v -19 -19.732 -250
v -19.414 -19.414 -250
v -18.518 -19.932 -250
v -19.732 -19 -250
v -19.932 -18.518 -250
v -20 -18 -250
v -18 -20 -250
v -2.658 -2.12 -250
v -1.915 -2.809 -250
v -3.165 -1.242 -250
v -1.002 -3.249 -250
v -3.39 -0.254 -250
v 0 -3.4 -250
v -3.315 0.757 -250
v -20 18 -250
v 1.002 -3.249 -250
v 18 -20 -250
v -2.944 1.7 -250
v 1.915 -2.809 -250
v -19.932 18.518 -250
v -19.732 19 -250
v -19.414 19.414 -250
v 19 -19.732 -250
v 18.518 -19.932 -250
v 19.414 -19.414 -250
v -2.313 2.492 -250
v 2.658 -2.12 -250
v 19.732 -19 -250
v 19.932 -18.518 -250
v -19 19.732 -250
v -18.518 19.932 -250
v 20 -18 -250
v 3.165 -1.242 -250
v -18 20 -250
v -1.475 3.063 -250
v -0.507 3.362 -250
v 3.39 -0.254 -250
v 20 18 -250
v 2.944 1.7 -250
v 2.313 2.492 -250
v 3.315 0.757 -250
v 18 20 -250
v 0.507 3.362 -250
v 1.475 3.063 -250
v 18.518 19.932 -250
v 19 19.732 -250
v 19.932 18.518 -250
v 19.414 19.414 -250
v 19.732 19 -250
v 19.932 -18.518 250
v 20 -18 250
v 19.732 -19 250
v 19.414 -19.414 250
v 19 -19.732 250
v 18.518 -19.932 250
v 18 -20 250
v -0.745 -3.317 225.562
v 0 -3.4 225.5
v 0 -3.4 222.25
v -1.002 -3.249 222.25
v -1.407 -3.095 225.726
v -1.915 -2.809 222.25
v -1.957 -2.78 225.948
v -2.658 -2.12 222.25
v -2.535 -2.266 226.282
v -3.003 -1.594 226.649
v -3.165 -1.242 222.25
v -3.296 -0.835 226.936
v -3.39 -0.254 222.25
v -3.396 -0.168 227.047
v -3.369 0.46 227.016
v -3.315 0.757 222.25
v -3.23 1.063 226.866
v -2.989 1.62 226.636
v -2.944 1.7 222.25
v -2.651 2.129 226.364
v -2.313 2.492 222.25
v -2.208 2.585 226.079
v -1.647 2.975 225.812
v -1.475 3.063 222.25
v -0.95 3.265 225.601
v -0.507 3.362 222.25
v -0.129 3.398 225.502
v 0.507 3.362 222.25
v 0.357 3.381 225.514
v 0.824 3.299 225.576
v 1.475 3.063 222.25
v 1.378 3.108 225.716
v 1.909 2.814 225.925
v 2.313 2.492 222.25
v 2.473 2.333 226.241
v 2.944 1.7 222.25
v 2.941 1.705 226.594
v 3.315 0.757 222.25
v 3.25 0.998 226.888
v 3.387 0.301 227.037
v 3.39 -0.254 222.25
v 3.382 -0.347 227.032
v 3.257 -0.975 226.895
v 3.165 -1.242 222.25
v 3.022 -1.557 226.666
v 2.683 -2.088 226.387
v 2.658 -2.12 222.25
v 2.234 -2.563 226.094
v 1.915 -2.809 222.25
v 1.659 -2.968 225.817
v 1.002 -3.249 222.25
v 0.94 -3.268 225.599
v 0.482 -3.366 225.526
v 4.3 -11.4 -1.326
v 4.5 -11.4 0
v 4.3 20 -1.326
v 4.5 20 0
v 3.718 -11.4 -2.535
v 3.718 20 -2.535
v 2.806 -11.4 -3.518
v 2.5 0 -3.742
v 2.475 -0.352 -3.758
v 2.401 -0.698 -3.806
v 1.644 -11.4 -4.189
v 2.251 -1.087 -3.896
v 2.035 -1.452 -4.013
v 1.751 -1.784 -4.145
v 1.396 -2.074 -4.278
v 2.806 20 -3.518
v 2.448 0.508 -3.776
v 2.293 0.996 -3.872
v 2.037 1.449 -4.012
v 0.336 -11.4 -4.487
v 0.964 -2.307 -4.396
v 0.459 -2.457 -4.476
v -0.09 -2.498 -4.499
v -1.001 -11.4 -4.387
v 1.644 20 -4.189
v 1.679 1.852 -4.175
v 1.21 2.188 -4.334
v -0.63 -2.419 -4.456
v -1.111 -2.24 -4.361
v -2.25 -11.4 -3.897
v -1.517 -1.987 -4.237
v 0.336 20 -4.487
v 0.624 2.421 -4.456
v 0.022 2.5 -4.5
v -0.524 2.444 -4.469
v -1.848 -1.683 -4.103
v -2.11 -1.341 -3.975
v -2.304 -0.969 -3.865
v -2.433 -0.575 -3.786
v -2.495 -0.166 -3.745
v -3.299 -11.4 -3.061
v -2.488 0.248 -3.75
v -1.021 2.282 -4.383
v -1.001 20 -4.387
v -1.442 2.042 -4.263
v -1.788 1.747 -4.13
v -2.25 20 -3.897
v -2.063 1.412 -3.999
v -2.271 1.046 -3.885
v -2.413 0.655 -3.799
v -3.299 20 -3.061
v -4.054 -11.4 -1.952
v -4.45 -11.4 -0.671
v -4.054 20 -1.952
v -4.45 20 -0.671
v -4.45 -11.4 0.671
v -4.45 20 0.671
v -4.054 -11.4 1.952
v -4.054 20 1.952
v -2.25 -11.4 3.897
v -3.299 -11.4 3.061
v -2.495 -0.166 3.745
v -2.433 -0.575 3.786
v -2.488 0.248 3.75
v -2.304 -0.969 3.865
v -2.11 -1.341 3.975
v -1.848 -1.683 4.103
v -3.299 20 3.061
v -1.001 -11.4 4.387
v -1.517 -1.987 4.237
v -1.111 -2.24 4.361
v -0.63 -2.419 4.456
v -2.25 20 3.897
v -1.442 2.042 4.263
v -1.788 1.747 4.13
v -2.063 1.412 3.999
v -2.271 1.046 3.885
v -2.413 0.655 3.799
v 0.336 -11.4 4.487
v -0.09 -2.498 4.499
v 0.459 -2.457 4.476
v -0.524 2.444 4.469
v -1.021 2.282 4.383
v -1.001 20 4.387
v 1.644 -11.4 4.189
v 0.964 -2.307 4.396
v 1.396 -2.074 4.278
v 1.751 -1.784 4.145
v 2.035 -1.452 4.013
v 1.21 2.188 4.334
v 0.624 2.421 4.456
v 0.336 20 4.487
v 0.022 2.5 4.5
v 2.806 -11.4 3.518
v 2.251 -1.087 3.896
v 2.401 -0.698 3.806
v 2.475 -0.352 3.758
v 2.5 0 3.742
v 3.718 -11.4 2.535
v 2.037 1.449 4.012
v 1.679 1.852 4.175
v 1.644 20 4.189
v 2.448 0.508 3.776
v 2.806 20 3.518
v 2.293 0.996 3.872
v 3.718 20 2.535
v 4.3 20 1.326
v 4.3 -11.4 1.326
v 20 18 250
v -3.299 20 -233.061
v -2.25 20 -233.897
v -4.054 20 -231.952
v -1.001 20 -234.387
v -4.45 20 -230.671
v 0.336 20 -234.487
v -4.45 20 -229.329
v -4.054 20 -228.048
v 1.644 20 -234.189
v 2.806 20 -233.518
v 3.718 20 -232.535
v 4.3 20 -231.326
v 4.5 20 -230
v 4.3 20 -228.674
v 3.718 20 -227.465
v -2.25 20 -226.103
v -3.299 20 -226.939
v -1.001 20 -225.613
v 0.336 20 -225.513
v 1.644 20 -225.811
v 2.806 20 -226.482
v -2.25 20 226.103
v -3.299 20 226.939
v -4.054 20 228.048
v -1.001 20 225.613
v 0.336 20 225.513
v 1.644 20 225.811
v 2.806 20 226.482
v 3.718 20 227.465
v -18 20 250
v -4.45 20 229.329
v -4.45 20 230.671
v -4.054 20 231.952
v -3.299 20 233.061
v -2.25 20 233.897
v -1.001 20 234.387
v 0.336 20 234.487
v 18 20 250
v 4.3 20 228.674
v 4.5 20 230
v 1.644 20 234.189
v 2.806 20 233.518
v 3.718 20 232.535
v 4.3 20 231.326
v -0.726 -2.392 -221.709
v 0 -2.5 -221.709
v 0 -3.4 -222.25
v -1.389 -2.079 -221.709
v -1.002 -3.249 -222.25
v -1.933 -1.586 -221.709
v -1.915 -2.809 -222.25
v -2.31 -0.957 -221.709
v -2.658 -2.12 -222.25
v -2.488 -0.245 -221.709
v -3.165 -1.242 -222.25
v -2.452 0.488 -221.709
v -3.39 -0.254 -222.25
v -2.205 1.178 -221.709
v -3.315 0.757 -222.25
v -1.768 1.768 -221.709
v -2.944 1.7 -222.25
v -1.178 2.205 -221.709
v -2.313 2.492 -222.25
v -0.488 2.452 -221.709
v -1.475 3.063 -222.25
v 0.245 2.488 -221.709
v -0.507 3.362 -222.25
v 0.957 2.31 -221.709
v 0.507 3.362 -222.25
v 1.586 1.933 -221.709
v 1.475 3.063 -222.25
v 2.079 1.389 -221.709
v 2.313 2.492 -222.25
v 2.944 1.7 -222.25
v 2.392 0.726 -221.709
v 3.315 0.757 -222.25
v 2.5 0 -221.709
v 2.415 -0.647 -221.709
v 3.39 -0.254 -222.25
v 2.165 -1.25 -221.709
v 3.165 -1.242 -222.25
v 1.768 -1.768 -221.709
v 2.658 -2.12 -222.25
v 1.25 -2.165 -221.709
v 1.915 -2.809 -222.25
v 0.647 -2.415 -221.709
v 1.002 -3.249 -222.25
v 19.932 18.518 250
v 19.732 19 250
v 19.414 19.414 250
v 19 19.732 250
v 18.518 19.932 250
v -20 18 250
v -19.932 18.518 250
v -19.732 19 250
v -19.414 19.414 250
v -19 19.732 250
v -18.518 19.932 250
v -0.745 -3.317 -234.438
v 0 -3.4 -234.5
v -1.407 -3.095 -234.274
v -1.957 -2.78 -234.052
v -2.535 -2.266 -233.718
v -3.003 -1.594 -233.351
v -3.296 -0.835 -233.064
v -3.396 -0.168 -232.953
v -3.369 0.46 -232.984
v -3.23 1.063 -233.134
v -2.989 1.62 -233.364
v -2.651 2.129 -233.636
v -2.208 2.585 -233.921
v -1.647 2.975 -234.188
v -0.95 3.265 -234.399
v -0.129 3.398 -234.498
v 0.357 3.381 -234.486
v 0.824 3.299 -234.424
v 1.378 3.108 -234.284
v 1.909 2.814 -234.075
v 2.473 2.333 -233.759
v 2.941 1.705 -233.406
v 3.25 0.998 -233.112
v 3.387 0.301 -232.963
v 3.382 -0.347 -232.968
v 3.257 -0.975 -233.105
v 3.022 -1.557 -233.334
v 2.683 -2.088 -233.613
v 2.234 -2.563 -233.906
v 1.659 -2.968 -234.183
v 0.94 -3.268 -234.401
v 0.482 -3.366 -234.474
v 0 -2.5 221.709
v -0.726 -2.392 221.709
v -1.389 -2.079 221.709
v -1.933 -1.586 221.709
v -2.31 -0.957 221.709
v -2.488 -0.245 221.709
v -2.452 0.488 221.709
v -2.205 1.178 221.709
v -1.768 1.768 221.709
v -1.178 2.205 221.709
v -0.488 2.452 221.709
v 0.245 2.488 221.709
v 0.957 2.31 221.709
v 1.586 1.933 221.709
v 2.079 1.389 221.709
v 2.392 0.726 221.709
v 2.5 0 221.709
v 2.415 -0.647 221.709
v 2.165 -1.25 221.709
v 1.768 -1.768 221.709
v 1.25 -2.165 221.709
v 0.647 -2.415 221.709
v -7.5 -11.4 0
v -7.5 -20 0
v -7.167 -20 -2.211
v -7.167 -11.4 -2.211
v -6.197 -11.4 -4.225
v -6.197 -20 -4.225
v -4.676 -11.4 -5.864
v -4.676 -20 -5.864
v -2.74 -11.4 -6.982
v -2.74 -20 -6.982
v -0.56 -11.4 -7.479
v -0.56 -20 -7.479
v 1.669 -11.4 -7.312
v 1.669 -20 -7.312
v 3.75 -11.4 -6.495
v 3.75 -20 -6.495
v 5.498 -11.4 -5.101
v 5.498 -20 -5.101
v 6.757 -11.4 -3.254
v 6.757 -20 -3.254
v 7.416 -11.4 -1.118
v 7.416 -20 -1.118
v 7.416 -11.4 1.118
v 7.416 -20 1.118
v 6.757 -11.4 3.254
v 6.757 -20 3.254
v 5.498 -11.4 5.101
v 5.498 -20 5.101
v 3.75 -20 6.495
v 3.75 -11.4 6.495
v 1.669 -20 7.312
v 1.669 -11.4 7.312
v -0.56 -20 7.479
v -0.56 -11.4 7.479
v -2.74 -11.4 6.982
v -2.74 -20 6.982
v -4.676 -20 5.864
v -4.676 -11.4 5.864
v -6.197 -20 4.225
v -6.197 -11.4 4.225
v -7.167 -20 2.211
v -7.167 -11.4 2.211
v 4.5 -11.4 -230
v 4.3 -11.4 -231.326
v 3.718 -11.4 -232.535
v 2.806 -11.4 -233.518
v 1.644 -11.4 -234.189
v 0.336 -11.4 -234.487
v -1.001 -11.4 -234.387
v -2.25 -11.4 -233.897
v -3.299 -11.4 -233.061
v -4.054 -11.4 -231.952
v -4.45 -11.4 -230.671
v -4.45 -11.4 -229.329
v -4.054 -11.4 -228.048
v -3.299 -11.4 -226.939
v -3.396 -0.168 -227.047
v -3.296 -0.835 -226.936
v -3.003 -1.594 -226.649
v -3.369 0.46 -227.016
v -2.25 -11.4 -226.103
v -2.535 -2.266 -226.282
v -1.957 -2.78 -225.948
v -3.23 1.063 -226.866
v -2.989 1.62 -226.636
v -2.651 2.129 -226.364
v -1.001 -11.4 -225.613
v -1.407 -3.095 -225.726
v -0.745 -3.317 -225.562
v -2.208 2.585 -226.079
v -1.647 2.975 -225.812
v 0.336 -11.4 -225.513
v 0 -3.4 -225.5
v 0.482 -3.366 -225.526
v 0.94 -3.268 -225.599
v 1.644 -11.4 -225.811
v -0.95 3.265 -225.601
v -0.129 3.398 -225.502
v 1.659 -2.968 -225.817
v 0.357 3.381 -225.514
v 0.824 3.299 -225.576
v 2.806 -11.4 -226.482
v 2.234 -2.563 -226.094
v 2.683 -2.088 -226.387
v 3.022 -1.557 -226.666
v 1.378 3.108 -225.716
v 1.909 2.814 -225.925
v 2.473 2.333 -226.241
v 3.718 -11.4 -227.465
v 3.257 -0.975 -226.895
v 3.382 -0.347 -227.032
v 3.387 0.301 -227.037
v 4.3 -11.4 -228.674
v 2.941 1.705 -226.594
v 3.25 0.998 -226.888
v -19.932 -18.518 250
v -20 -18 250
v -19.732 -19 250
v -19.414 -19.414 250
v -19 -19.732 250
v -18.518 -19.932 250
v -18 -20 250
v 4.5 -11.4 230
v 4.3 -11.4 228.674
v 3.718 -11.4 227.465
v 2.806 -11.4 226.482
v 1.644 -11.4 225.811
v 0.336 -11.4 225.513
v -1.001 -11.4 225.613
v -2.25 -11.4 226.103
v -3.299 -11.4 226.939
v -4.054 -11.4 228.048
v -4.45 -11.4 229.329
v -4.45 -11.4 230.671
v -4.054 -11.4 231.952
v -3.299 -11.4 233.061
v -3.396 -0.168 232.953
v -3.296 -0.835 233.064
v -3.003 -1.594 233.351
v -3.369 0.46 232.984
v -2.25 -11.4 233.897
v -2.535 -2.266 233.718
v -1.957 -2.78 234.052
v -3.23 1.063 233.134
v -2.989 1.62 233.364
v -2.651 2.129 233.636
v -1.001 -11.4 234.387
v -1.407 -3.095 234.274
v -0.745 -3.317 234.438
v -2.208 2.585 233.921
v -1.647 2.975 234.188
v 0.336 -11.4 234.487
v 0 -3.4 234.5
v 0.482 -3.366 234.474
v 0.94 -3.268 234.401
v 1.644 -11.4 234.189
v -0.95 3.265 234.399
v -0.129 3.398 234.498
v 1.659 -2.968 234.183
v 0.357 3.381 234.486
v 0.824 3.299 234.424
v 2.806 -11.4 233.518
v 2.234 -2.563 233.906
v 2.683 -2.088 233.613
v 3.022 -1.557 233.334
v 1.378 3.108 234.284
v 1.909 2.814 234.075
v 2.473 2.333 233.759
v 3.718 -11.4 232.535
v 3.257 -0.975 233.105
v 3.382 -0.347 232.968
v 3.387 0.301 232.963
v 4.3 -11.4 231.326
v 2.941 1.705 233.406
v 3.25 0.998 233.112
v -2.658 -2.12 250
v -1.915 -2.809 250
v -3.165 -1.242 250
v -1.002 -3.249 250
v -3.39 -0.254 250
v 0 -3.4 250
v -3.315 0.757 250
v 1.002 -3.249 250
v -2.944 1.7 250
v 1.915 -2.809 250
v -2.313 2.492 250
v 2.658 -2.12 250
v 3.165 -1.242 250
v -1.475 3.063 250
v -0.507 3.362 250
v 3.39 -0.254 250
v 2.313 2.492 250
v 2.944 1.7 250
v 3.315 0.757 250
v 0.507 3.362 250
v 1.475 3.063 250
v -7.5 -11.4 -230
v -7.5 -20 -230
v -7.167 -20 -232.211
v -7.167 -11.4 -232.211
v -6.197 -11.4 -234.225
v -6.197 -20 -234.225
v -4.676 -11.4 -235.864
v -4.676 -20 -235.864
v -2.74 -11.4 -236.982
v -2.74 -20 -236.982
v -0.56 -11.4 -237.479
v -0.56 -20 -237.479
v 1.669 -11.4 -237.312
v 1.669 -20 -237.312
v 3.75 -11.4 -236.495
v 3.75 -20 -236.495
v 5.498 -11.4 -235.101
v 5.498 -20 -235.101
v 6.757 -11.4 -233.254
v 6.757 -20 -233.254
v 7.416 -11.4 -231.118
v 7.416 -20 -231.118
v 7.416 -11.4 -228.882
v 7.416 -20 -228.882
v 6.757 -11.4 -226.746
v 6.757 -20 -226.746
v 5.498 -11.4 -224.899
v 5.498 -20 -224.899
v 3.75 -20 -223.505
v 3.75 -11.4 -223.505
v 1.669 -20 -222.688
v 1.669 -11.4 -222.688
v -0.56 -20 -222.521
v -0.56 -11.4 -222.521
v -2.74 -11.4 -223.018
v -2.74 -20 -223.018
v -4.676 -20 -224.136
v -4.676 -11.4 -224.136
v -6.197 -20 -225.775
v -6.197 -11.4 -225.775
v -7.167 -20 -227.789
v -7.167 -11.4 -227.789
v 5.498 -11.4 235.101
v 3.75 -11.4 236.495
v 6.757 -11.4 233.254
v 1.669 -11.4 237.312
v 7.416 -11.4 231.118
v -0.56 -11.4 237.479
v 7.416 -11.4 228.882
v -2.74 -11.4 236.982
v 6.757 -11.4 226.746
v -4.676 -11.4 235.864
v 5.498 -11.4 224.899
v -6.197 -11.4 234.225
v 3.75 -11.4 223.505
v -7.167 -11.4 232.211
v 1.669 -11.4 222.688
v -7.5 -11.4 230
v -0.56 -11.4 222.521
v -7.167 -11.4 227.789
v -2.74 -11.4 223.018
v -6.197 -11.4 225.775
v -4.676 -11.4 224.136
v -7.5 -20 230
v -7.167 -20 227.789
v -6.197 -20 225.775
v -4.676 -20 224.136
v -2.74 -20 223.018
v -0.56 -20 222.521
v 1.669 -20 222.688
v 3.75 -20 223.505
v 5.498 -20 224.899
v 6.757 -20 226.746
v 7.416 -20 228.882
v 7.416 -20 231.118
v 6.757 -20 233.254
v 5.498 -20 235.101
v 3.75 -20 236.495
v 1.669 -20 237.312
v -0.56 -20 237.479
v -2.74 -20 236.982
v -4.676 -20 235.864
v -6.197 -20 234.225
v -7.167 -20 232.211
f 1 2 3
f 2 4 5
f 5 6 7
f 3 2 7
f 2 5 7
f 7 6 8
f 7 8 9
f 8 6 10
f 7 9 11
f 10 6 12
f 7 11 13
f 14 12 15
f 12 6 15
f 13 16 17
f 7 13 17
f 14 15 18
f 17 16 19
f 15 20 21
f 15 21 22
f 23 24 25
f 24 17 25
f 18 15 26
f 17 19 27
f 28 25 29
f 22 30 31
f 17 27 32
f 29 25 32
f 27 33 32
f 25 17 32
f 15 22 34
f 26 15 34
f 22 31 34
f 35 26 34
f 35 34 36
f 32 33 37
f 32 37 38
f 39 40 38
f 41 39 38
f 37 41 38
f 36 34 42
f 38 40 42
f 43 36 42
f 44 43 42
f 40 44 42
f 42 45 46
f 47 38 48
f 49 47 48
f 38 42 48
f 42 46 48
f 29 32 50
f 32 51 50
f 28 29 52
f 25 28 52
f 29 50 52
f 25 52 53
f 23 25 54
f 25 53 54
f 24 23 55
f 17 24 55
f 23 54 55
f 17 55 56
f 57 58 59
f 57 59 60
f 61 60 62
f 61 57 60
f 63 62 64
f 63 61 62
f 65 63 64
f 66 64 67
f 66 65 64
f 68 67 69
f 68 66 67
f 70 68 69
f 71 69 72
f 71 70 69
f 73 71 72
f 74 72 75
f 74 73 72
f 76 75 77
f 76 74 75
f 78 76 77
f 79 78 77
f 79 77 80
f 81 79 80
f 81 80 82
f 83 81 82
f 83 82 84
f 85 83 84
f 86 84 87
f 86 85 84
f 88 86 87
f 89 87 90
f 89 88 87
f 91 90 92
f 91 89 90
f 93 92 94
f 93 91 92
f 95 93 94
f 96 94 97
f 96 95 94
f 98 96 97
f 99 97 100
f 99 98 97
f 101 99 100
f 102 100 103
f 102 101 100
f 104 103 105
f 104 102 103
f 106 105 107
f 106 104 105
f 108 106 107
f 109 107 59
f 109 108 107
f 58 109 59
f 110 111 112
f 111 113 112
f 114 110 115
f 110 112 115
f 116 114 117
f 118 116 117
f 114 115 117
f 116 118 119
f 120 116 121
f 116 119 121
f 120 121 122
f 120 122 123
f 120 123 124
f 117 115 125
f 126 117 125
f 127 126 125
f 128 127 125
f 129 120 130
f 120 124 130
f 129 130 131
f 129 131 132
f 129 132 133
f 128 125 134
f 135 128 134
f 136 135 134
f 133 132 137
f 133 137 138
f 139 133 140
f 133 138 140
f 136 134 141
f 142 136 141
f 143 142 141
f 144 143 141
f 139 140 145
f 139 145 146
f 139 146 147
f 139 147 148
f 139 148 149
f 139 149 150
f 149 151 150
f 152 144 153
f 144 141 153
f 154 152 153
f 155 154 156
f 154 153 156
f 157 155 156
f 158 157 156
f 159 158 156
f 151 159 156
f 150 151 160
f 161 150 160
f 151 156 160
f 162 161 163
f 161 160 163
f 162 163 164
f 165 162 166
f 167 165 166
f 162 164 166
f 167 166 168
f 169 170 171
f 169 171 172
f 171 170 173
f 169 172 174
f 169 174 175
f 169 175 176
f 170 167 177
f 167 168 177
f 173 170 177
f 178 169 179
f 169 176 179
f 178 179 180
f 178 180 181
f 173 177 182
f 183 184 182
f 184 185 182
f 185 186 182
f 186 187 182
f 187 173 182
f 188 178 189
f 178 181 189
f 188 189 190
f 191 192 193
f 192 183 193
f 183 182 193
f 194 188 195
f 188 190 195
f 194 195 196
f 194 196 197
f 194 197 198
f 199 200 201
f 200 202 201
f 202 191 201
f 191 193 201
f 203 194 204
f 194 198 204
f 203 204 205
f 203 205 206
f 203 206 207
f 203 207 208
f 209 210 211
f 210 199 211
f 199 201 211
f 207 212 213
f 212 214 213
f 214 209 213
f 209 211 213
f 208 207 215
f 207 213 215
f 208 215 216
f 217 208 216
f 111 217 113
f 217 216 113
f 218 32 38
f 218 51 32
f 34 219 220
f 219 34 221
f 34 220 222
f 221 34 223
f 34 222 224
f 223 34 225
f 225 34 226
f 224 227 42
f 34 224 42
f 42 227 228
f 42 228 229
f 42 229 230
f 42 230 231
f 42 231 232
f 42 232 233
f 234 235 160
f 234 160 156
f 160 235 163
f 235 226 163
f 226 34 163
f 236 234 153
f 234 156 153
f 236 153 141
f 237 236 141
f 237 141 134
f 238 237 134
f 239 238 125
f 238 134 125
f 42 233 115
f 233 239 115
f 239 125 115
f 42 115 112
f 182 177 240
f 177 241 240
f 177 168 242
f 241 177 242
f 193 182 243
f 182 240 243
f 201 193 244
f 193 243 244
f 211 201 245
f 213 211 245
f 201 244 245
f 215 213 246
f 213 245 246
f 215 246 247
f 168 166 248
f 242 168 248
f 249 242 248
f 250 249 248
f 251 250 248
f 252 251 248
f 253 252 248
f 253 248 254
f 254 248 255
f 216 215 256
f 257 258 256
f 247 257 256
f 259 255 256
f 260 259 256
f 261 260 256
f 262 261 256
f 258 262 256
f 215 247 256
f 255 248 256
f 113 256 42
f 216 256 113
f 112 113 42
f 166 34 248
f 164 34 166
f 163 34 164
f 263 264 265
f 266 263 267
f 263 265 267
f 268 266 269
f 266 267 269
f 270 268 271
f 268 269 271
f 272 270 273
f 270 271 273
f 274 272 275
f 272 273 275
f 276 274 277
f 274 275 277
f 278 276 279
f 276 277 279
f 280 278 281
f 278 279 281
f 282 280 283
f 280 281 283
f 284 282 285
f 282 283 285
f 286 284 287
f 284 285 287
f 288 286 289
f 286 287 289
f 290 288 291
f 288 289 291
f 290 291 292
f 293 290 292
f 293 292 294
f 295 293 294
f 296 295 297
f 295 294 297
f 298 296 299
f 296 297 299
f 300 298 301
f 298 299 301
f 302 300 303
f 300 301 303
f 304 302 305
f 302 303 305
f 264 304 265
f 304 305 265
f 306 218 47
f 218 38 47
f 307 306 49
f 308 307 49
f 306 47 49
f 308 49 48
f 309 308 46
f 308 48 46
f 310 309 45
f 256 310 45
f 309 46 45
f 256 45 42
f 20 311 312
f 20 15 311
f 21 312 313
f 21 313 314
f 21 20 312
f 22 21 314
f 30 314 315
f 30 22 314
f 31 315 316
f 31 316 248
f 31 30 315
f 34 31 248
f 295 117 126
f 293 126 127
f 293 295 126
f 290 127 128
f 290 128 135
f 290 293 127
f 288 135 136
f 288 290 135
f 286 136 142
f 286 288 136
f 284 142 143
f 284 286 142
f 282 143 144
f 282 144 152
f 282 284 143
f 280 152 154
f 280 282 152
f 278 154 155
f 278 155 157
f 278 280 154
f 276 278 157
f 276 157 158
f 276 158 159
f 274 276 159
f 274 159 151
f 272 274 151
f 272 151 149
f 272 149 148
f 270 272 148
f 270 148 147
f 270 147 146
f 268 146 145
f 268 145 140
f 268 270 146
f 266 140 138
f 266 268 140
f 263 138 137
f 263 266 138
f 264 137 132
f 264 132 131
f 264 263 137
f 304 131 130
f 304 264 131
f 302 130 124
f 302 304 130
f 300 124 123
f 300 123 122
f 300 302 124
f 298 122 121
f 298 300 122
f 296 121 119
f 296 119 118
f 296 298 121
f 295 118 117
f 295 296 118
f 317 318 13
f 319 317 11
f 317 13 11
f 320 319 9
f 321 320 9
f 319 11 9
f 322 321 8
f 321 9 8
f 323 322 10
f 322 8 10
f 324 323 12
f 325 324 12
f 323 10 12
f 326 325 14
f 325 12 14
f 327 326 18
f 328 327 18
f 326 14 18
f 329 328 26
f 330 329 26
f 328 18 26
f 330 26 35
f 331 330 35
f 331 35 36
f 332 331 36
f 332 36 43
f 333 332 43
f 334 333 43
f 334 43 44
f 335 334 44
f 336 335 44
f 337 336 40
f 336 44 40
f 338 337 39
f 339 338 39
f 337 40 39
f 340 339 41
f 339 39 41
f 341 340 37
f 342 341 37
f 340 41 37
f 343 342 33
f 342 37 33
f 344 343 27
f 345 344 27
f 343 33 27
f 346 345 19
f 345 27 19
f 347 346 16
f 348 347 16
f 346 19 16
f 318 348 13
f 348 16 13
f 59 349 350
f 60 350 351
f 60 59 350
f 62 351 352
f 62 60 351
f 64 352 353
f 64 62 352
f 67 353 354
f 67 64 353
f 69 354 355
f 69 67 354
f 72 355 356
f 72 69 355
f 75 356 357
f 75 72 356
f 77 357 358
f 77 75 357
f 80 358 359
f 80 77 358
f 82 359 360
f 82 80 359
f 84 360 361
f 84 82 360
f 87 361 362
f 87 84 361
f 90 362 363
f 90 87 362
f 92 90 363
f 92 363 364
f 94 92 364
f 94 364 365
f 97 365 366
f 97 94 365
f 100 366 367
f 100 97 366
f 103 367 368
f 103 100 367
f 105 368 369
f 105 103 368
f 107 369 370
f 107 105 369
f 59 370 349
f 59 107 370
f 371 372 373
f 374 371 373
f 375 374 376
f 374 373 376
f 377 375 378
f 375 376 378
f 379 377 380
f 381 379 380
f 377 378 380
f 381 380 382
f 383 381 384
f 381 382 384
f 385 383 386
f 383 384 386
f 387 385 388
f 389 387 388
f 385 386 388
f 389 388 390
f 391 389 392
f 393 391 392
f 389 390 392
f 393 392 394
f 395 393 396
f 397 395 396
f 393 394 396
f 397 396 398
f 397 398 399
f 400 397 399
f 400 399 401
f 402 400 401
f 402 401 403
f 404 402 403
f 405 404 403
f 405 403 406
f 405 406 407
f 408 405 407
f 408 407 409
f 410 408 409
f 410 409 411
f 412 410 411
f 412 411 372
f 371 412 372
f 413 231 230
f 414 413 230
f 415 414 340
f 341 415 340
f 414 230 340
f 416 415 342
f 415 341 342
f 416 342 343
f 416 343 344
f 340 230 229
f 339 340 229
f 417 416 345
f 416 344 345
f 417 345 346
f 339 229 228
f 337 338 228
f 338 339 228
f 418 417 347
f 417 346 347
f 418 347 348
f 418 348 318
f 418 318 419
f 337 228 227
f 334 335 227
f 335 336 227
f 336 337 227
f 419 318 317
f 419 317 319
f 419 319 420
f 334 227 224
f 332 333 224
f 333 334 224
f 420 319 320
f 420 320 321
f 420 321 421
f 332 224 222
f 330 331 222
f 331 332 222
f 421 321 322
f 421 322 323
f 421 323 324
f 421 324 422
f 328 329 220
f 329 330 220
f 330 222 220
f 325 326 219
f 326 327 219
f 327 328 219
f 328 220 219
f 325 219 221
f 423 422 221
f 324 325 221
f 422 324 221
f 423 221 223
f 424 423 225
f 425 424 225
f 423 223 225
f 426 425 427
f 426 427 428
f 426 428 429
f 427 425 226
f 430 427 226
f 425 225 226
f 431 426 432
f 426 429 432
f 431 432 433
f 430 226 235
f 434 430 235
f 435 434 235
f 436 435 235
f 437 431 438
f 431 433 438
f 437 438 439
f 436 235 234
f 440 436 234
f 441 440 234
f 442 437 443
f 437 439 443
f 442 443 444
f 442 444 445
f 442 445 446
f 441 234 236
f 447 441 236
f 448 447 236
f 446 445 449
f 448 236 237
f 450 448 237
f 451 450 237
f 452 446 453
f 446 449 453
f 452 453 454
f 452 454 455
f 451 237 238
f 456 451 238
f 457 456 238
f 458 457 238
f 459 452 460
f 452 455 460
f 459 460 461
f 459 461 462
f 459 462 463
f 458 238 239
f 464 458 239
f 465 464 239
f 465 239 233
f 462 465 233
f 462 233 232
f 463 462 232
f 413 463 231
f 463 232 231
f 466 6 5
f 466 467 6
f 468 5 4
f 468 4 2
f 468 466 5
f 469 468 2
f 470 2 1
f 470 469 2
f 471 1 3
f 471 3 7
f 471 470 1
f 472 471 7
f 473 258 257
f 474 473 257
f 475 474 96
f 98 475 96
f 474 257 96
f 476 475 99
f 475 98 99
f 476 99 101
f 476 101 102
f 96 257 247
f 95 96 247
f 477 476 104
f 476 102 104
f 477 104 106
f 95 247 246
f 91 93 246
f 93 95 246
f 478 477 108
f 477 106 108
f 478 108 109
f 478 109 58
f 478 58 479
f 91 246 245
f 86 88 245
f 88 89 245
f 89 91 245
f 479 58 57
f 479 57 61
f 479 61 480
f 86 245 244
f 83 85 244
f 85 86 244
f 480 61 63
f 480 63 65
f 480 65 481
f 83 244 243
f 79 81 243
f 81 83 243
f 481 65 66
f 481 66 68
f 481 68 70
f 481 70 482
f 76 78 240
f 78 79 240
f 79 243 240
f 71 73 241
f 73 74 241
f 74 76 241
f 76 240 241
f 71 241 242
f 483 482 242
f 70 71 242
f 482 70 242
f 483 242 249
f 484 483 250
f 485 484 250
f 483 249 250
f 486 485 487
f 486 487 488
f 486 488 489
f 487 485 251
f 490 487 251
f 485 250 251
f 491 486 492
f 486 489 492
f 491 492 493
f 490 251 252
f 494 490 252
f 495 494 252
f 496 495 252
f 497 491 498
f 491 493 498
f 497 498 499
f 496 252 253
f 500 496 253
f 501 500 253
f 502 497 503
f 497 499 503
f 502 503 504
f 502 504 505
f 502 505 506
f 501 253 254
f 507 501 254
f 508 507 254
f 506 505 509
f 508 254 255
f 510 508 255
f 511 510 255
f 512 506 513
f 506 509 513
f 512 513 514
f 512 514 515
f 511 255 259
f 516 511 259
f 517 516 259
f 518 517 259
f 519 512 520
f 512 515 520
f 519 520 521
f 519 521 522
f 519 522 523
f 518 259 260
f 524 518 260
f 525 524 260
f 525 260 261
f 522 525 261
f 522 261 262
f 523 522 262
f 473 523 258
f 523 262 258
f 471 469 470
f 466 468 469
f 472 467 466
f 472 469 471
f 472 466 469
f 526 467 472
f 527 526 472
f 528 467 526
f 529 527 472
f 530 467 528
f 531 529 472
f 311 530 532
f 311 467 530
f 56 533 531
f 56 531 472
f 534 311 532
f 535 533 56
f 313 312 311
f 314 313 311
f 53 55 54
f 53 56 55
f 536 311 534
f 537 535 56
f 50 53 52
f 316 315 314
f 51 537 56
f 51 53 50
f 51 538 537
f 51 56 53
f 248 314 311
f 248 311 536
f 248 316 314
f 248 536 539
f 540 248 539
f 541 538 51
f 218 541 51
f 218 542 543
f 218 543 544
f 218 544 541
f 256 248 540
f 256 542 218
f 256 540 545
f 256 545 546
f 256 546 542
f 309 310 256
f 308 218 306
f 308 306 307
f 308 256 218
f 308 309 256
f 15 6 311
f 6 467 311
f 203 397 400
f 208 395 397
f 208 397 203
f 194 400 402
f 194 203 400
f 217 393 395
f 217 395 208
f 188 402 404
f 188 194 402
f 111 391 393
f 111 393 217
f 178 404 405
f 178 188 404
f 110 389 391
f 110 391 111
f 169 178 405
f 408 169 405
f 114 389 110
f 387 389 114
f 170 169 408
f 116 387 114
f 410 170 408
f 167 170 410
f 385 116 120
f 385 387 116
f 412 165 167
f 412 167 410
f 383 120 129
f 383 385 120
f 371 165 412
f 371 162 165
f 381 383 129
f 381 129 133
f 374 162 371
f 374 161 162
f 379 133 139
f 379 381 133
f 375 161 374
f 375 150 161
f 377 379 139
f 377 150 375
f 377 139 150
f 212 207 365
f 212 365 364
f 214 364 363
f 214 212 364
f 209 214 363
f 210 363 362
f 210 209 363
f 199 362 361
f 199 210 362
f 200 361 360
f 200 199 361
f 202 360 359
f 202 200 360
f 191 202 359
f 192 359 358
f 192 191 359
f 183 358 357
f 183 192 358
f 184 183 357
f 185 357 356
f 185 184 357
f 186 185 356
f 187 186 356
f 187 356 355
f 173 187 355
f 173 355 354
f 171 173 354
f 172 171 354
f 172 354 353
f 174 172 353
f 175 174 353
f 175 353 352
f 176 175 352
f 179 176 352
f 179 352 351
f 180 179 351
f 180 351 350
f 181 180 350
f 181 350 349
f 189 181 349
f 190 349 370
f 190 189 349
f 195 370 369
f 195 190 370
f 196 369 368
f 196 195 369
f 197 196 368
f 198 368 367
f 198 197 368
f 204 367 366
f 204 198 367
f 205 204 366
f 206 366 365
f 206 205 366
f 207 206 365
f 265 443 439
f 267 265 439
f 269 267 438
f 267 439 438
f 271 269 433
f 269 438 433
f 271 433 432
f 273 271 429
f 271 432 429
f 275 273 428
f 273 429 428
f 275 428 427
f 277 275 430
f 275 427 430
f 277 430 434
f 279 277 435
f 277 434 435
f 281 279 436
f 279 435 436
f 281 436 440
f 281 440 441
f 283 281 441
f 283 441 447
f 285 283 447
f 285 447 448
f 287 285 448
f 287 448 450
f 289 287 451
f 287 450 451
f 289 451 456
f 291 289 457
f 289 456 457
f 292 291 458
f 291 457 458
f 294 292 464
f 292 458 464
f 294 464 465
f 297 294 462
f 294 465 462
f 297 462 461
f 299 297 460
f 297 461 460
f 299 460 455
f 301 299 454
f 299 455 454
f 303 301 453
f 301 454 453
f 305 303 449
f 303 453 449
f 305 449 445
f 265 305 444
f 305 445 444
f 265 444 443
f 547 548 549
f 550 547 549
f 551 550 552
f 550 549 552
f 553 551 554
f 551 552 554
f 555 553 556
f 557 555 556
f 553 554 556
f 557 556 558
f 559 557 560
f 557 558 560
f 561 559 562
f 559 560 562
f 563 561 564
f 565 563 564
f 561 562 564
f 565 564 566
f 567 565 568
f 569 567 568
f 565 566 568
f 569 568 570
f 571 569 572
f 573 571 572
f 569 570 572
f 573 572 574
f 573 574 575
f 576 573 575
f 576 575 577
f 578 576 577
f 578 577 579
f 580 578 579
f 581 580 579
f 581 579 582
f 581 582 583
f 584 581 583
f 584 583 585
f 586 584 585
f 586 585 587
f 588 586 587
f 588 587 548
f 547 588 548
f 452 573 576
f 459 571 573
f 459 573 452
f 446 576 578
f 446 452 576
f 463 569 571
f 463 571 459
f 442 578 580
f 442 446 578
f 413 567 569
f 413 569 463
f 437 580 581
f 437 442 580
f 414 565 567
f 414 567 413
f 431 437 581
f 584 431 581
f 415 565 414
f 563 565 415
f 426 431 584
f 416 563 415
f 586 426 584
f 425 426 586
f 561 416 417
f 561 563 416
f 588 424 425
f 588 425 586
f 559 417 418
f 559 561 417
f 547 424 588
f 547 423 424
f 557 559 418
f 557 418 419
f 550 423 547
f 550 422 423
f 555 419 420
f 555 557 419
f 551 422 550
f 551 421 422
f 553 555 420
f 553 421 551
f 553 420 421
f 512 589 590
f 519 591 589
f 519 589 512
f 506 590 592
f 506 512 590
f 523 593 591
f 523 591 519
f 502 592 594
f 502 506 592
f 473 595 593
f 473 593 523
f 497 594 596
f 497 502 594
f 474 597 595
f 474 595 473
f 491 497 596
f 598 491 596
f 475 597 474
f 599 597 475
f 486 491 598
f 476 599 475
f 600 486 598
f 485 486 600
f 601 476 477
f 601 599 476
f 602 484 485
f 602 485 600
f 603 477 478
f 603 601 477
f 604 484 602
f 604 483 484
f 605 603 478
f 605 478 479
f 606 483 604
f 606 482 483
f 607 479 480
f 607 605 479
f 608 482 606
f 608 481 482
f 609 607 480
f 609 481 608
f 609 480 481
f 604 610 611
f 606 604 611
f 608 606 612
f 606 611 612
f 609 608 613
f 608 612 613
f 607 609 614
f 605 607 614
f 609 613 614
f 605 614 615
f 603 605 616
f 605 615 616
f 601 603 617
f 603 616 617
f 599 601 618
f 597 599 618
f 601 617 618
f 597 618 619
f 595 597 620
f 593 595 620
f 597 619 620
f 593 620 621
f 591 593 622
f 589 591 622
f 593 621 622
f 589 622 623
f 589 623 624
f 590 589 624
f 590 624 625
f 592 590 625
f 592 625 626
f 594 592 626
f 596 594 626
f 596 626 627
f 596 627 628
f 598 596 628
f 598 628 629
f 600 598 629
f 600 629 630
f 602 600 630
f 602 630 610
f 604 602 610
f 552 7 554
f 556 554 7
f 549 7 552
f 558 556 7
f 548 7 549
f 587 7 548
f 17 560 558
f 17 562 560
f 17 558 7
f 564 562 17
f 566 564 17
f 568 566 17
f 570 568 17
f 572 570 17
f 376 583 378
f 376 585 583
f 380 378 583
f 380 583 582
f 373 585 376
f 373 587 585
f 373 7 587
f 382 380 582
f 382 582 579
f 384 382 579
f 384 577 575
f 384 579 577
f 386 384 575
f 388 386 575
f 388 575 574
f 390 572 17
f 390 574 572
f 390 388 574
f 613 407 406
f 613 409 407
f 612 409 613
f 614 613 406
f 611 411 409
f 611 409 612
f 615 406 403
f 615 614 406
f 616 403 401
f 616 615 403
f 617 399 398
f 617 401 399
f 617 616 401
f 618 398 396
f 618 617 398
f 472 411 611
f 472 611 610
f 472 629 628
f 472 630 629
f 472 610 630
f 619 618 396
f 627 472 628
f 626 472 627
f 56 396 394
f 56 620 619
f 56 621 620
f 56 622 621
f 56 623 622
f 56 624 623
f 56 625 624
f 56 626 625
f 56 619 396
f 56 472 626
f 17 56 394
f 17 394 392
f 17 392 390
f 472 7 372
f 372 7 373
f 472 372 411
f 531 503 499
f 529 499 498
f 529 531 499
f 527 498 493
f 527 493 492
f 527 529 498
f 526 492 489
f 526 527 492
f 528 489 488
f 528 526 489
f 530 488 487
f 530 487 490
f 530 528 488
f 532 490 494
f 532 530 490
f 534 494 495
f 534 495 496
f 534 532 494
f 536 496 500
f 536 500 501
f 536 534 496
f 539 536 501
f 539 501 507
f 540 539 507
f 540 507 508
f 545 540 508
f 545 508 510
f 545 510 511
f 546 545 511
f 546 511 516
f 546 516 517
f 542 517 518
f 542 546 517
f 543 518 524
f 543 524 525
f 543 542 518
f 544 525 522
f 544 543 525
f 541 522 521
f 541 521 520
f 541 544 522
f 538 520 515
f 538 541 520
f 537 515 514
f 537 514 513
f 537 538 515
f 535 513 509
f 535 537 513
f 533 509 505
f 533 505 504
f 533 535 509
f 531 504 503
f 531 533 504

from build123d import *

# Parameters (mm, degrees)
SKETCH1_W                                           = 40
SKETCH1_H                                           = 40
SKETCH1_R                                           = 2.5
BOSS_EXTRUDE1_DEPTH                                 = 250
FILLET1_R                                           = 2
CBORE_FOR_M8_HEX_SOCKET_HEAD_CAP_SCREW1_D           = 9
CBORE_FOR_M8_HEX_SOCKET_HEAD_CAP_SCREW1_CBORE_D     = 15
CBORE_FOR_M8_HEX_SOCKET_HEAD_CAP_SCREW1_CBORE_DEPTH = 8.6


with BuildPart() as part:
    # Sketch1 → Boss-Extrude1 (new, symmetric)
    with BuildSketch(Plane.XY):
        Rectangle(SKETCH1_W, SKETCH1_H)
        Circle(SKETCH1_R, mode=Mode.SUBTRACT)
    extrude(amount=BOSS_EXTRUDE1_DEPTH, both=True)

    # Fillet1
    fillet1_edges = [part.edges().sort_by_distance(p)[0] for p in [
        (20, -20, 0),
        (-20, -20, 0),
        (-20, 20, 0),
        (20, 20, 0),
    ]]
    fillet(fillet1_edges, radius=FILLET1_R)

    # CBORE for M8 Hex Socket Head Cap Screw1 (through all)
    with Locations(Plane(origin=(0, -20, 0), x_dir=(-1, 0, 0), z_dir=(0, -1, 0))):
        with Locations((0, 500), (0, 0), (0, -500), (0, 230), (0, -230)):
            CounterBoreHole(CBORE_FOR_M8_HEX_SOCKET_HEAD_CAP_SCREW1_D / 2, CBORE_FOR_M8_HEX_SOCKET_HEAD_CAP_SCREW1_CBORE_D / 2, CBORE_FOR_M8_HEX_SOCKET_HEAD_CAP_SCREW1_CBORE_DEPTH)

    # Sketch9 → M8x1.25 Tapped Hole1 (revolve, cut)
    with BuildSketch(Plane(origin=(0, 0, 250), x_dir=(0, -1, 0), z_dir=(1, 0, 0))):
        Polygon((0, 0), (0, 29.792926105), (3.4, 27.75), (3.4, 0), align=None)
    m8x1_25_tapped_hole1 = revolve(axis=Axis((0, 0, 256.35), (0, 0, -1)), mode=Mode.SUBTRACT)

    # Mirror1: M8x1.25 Tapped Hole1 across plane
    add(m8x1_25_tapped_hole1.mirror(Plane.XY), mode=Mode.SUBTRACT)


solid = part.part
